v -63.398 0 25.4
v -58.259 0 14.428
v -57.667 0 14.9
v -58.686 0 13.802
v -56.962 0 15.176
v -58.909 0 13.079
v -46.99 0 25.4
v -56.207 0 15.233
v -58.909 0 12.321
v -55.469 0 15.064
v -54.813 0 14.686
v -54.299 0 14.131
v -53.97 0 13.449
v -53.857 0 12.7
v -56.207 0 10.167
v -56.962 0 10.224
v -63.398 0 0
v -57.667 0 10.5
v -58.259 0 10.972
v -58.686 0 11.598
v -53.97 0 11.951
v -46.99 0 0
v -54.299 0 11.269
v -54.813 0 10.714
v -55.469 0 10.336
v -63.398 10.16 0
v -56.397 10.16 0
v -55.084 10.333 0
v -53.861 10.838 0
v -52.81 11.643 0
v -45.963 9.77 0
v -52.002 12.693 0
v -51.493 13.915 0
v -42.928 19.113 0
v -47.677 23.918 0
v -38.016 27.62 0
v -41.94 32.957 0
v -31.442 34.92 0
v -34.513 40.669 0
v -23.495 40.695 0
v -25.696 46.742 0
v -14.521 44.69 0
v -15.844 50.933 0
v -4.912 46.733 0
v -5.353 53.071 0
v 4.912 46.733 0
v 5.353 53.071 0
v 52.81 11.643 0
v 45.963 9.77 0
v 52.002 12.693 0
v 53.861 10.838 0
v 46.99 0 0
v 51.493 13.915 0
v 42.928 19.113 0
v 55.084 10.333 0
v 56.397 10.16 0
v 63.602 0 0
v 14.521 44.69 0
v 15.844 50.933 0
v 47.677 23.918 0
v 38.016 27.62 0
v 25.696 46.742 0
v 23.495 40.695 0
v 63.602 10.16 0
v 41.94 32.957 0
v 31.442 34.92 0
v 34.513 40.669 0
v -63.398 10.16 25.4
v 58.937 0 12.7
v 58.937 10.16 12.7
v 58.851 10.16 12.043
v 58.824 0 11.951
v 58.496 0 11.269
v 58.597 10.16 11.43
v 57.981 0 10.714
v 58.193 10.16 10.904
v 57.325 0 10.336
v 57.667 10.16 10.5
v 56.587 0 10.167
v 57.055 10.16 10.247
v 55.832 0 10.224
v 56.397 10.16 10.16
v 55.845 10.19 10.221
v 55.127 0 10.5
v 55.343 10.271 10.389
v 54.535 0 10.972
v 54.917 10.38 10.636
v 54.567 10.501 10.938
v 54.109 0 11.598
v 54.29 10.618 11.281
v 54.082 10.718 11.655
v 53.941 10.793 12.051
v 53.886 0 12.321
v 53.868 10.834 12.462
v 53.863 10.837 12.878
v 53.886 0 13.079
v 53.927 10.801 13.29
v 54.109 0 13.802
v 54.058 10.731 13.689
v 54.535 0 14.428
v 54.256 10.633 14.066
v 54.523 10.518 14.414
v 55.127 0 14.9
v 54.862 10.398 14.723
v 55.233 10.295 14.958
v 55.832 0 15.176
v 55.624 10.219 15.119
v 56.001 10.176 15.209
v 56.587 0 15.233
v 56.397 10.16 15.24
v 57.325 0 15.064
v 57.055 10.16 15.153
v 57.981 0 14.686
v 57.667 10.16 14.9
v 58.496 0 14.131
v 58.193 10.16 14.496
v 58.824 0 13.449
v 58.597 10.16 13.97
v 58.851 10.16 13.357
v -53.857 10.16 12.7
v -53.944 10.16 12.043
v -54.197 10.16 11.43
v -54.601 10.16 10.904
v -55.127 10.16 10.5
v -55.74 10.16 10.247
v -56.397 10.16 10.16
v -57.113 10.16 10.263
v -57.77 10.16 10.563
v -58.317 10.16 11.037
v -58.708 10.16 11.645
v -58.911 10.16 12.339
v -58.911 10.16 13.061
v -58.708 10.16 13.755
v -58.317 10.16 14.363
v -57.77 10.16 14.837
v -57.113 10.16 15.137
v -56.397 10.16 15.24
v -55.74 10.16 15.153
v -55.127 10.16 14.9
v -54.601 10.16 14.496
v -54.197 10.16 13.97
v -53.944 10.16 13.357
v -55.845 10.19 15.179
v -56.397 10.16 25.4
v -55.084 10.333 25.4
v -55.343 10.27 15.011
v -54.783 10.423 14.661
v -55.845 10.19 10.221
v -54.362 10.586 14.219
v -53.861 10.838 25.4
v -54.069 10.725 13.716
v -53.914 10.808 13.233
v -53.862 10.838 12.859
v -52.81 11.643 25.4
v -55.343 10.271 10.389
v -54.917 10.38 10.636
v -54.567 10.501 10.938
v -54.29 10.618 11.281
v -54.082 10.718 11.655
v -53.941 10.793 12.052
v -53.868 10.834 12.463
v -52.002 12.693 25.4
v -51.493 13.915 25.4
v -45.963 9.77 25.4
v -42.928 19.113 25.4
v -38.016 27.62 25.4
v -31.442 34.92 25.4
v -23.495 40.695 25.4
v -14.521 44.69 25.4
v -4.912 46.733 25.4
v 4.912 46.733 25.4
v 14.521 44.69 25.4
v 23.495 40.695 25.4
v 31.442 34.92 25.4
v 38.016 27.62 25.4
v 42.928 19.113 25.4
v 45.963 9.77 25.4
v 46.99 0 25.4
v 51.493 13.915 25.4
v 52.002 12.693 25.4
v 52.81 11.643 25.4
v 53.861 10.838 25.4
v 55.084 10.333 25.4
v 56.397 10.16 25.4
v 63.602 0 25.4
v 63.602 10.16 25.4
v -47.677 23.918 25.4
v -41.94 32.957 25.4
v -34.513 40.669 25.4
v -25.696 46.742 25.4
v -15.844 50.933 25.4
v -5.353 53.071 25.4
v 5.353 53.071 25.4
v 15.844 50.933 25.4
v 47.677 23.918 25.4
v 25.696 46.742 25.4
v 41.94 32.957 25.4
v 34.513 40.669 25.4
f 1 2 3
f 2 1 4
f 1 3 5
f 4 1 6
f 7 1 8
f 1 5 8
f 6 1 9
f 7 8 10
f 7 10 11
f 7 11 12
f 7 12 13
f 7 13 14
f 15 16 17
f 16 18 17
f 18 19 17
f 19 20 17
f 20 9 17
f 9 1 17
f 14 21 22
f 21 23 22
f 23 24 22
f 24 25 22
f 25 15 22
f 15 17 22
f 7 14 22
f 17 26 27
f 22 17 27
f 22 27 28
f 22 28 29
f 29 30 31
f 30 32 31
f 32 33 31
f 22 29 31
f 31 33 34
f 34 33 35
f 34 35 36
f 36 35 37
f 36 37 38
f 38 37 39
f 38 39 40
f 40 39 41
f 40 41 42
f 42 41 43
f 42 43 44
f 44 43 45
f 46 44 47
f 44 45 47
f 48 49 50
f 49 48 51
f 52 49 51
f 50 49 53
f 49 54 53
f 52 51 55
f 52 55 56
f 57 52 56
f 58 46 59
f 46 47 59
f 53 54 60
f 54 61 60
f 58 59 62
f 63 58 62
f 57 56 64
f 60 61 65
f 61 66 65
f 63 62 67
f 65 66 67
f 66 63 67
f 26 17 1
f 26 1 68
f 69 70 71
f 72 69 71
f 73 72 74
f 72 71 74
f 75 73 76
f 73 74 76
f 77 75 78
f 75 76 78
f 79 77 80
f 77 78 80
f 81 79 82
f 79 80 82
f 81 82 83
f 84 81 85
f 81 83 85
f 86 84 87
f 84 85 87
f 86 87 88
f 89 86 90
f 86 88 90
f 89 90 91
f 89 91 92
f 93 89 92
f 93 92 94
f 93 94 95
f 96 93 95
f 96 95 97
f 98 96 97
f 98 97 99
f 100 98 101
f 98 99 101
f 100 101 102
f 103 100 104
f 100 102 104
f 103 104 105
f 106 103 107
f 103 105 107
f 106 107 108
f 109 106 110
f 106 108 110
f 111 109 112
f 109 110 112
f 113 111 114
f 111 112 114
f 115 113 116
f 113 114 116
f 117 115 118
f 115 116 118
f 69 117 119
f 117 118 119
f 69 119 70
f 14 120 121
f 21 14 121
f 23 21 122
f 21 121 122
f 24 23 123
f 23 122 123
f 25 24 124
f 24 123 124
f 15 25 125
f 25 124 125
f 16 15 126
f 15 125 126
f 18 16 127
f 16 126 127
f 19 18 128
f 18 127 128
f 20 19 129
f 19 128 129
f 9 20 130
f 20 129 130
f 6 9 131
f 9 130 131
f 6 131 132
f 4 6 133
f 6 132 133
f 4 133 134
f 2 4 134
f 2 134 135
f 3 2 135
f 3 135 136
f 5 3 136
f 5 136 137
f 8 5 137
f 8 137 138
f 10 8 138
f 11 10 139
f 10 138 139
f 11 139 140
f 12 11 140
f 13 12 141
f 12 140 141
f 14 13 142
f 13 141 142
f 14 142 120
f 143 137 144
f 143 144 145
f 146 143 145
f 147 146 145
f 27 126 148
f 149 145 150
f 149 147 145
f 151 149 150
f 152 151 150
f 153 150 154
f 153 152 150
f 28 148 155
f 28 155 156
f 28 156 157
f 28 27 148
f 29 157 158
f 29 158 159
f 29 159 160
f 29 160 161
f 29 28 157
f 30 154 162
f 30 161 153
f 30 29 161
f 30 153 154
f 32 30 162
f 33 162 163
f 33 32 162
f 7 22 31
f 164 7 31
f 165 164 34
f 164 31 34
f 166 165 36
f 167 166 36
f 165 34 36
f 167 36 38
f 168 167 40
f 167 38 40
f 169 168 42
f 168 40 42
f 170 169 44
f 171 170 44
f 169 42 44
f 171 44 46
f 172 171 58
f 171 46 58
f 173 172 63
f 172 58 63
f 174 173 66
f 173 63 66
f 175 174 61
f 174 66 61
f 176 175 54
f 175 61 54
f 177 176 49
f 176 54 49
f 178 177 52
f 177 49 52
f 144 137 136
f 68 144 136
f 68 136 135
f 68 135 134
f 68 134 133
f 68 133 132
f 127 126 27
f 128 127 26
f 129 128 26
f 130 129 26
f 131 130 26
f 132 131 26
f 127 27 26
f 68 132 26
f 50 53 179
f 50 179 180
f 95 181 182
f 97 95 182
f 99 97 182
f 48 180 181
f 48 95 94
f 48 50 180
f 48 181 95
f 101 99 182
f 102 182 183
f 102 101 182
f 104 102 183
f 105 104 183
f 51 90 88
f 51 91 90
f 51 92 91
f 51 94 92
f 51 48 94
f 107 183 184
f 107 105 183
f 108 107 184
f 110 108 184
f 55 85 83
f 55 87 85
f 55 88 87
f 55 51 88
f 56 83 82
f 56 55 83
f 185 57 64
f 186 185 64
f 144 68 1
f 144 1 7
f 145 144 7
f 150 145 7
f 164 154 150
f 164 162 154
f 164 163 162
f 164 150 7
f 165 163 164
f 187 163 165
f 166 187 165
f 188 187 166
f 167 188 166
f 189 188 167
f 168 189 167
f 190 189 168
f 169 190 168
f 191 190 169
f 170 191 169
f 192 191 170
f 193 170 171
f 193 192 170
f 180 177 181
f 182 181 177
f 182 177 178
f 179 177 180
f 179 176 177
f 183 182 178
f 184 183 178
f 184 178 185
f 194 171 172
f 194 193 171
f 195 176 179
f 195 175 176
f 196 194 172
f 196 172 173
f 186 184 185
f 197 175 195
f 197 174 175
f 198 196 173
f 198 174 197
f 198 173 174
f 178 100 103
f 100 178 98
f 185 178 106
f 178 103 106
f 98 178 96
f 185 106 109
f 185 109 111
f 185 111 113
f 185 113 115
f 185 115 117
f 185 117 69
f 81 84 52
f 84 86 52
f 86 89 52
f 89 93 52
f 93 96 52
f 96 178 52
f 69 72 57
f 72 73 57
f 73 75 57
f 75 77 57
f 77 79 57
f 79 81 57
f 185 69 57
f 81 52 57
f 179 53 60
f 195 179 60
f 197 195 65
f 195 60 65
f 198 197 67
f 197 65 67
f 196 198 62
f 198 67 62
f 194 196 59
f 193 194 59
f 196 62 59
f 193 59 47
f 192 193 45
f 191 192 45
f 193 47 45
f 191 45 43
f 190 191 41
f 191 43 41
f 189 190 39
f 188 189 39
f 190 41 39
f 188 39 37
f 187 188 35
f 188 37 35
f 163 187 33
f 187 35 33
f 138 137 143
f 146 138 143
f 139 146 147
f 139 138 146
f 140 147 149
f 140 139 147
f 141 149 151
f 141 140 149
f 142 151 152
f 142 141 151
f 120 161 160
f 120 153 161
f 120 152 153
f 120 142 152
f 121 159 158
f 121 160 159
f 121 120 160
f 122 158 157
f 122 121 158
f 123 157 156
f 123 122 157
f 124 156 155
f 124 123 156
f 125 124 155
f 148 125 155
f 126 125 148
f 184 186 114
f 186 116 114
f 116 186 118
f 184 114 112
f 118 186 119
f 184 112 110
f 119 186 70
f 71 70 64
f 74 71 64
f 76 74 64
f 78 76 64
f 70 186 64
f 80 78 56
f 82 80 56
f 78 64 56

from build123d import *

# Parameters (mm, degrees)
BOSS_EXTRUDE1_DEPTH     = 25.4
SKETCH3_W               = 16.407631331
SKETCH3_H               = 10.16
BOSS_EXTRUDE2_DEPTH     = 25.4
FILLET1_R               = 5.08
SKETCH4_R               = 2.54
CUT_EXTRUDE1_DEPTH      = 44.18
CUT_EXTRUDE1_DEPTH_BACK = 11.16


with BuildPart() as part:
    # Sketch1 → Boss-Extrude1 (new body)
    with BuildSketch(Plane.XY):
        with BuildLine():
            Line((-53.34, 0), (-46.99, 0))
            ThreePointArc((-46.99, 0), (0, 46.99), (46.99, 0))
            Line((46.99, 0), (53.34, 0))
            ThreePointArc((53.34, 0), (0, 53.34), (-53.34, 0))
        make_face()
    extrude(amount=BOSS_EXTRUDE1_DEPTH)

    # Sketch3 → Boss-Extrude2 (add)
    with BuildSketch(Plane(origin=(0, 0, 0), x_dir=(-1, 0, 0), z_dir=(0, 0, -1))):
        with Locations((55.193815666, 5.08)):
            Rectangle(SKETCH3_W, SKETCH3_H)
        with Locations((-55.398553003, 5.08)):
            Rectangle(SKETCH3_W, SKETCH3_H)
    extrude(amount=-BOSS_EXTRUDE2_DEPTH)

    # Fillet1
    fillet1_edges = [part.edges().sort_by_distance(p)[0] for p in [
        (-52.363441445, 10.16, 12.7),
        (52.363441445, 10.16, 12.7),
    ]]
    fillet(fillet1_edges, radius=FILLET1_R)

    # Sketch4 → Cut-Extrude1 (cut, two sides)
    with BuildSketch(Plane(origin=(0, 10.16, 0), x_dir=(1, 0, 0), z_dir=(0, 1, 0))) as cut_extrude1_sk:
        with Locations((-56.39715241, -12.7)):
            Circle(SKETCH4_R)
        with Locations((56.39715241, -12.7)):
            Circle(SKETCH4_R)
    extrude(amount=CUT_EXTRUDE1_DEPTH, mode=Mode.SUBTRACT)
    extrude(cut_extrude1_sk.sketch, amount=-CUT_EXTRUDE1_DEPTH_BACK, mode=Mode.SUBTRACT)


solid = part.part
